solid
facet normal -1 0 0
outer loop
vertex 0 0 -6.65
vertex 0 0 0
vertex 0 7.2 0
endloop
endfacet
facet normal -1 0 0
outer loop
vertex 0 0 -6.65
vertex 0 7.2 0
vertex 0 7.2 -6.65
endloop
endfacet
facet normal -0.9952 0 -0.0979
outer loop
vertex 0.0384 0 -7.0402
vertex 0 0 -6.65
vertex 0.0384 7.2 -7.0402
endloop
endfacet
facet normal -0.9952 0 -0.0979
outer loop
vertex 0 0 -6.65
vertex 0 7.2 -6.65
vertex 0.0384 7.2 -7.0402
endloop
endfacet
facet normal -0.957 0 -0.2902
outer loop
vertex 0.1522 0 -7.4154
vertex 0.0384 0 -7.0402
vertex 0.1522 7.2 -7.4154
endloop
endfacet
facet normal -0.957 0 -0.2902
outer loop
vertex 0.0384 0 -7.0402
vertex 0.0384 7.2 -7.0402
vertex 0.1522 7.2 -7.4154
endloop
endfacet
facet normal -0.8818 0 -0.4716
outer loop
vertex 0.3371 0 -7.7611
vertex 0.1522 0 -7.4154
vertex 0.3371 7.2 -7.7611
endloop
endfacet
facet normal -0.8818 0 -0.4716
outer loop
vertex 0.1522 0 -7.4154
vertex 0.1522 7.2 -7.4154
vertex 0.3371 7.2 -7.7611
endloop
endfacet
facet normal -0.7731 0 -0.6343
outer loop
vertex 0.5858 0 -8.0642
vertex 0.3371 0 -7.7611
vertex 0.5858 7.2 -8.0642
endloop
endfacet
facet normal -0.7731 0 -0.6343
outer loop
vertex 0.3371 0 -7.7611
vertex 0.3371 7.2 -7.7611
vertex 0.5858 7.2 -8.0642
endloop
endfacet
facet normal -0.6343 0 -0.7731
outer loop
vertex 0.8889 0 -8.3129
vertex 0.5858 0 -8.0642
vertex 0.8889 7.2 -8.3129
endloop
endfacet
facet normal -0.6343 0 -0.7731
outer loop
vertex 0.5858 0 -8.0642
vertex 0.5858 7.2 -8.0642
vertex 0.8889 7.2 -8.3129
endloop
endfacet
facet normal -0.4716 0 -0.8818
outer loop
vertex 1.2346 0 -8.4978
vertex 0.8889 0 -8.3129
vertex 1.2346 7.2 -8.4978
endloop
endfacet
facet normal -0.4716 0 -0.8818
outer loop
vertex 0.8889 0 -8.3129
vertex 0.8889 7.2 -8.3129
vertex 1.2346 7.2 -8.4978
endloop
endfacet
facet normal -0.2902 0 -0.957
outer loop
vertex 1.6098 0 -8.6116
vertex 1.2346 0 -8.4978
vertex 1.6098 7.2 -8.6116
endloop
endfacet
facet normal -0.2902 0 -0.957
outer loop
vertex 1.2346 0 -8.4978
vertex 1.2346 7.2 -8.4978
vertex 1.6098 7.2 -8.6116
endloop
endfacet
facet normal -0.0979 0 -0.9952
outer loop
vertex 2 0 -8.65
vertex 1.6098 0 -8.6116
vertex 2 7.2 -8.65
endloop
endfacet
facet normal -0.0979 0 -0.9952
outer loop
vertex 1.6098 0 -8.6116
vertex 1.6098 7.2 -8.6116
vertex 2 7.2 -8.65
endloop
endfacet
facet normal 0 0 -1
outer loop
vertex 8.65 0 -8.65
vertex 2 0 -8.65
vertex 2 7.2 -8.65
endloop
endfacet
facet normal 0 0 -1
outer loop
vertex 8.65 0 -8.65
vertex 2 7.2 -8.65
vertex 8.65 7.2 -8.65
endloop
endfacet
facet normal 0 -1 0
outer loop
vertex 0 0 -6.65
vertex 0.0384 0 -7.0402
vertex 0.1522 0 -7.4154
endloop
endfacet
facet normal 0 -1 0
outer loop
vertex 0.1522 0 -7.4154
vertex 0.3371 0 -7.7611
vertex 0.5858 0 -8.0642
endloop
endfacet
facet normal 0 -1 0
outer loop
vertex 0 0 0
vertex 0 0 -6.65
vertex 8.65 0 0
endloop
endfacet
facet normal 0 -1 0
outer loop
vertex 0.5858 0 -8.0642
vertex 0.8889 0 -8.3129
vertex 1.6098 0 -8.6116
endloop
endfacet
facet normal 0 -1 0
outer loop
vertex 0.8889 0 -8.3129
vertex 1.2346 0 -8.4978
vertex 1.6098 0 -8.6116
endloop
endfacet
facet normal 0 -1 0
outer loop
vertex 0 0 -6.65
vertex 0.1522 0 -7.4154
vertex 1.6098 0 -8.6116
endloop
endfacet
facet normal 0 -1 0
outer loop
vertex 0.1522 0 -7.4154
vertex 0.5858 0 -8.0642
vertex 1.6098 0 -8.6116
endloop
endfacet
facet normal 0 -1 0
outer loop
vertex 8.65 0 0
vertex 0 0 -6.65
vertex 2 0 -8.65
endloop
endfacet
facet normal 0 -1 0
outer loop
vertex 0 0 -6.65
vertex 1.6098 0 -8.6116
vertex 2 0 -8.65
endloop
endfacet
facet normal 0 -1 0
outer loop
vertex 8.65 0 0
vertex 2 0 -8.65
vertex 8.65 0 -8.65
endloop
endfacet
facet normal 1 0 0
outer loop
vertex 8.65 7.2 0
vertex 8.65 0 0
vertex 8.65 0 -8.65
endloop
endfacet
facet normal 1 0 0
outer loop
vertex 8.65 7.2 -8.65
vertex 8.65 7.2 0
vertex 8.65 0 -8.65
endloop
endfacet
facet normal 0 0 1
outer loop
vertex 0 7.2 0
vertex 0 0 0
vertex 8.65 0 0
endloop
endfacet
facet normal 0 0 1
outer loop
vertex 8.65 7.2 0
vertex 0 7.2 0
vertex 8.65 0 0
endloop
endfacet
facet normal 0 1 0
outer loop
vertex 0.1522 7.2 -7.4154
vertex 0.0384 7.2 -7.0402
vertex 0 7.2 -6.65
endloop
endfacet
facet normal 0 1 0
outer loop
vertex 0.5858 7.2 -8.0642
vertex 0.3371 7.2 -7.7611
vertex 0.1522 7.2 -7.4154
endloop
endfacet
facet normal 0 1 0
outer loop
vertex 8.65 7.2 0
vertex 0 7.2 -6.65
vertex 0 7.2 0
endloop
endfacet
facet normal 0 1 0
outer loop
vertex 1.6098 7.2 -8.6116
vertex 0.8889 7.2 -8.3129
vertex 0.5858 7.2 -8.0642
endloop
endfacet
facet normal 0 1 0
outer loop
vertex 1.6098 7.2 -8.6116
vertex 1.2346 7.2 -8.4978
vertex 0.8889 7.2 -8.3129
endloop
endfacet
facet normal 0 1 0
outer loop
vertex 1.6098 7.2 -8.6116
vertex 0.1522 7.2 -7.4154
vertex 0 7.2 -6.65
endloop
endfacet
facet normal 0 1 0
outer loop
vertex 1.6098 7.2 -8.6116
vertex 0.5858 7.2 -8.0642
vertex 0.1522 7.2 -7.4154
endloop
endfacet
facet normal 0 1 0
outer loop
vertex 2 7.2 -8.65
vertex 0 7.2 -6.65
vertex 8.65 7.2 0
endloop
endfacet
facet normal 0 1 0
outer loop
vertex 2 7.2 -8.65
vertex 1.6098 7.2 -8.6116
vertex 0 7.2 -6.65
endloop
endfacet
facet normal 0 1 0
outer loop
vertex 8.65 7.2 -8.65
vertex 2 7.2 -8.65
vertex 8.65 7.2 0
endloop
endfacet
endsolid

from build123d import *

# Parameters (mm, degrees)
SKETCH2_W           = 8.65
SKETCH2_H           = 8.65
BOSS_EXTRUDE1_DEPTH = 7.2
FILLET1_R           = 2


with BuildPart() as part:
    # Sketch2 → Boss-Extrude1 (new body)
    with BuildSketch(Plane(origin=(0, 0, 0), x_dir=(1, 0, 0), z_dir=(0, 1, 0))):
        with Locations((4.325, 4.325)):
            Rectangle(SKETCH2_W, SKETCH2_H)
    extrude(amount=BOSS_EXTRUDE1_DEPTH)

    # Fillet1
    fillet1_edges = [part.edges().sort_by_distance(p)[0] for p in [
        (0, 3.6, -8.65),
    ]]
    fillet(fillet1_edges, radius=FILLET1_R)


solid = part.part
